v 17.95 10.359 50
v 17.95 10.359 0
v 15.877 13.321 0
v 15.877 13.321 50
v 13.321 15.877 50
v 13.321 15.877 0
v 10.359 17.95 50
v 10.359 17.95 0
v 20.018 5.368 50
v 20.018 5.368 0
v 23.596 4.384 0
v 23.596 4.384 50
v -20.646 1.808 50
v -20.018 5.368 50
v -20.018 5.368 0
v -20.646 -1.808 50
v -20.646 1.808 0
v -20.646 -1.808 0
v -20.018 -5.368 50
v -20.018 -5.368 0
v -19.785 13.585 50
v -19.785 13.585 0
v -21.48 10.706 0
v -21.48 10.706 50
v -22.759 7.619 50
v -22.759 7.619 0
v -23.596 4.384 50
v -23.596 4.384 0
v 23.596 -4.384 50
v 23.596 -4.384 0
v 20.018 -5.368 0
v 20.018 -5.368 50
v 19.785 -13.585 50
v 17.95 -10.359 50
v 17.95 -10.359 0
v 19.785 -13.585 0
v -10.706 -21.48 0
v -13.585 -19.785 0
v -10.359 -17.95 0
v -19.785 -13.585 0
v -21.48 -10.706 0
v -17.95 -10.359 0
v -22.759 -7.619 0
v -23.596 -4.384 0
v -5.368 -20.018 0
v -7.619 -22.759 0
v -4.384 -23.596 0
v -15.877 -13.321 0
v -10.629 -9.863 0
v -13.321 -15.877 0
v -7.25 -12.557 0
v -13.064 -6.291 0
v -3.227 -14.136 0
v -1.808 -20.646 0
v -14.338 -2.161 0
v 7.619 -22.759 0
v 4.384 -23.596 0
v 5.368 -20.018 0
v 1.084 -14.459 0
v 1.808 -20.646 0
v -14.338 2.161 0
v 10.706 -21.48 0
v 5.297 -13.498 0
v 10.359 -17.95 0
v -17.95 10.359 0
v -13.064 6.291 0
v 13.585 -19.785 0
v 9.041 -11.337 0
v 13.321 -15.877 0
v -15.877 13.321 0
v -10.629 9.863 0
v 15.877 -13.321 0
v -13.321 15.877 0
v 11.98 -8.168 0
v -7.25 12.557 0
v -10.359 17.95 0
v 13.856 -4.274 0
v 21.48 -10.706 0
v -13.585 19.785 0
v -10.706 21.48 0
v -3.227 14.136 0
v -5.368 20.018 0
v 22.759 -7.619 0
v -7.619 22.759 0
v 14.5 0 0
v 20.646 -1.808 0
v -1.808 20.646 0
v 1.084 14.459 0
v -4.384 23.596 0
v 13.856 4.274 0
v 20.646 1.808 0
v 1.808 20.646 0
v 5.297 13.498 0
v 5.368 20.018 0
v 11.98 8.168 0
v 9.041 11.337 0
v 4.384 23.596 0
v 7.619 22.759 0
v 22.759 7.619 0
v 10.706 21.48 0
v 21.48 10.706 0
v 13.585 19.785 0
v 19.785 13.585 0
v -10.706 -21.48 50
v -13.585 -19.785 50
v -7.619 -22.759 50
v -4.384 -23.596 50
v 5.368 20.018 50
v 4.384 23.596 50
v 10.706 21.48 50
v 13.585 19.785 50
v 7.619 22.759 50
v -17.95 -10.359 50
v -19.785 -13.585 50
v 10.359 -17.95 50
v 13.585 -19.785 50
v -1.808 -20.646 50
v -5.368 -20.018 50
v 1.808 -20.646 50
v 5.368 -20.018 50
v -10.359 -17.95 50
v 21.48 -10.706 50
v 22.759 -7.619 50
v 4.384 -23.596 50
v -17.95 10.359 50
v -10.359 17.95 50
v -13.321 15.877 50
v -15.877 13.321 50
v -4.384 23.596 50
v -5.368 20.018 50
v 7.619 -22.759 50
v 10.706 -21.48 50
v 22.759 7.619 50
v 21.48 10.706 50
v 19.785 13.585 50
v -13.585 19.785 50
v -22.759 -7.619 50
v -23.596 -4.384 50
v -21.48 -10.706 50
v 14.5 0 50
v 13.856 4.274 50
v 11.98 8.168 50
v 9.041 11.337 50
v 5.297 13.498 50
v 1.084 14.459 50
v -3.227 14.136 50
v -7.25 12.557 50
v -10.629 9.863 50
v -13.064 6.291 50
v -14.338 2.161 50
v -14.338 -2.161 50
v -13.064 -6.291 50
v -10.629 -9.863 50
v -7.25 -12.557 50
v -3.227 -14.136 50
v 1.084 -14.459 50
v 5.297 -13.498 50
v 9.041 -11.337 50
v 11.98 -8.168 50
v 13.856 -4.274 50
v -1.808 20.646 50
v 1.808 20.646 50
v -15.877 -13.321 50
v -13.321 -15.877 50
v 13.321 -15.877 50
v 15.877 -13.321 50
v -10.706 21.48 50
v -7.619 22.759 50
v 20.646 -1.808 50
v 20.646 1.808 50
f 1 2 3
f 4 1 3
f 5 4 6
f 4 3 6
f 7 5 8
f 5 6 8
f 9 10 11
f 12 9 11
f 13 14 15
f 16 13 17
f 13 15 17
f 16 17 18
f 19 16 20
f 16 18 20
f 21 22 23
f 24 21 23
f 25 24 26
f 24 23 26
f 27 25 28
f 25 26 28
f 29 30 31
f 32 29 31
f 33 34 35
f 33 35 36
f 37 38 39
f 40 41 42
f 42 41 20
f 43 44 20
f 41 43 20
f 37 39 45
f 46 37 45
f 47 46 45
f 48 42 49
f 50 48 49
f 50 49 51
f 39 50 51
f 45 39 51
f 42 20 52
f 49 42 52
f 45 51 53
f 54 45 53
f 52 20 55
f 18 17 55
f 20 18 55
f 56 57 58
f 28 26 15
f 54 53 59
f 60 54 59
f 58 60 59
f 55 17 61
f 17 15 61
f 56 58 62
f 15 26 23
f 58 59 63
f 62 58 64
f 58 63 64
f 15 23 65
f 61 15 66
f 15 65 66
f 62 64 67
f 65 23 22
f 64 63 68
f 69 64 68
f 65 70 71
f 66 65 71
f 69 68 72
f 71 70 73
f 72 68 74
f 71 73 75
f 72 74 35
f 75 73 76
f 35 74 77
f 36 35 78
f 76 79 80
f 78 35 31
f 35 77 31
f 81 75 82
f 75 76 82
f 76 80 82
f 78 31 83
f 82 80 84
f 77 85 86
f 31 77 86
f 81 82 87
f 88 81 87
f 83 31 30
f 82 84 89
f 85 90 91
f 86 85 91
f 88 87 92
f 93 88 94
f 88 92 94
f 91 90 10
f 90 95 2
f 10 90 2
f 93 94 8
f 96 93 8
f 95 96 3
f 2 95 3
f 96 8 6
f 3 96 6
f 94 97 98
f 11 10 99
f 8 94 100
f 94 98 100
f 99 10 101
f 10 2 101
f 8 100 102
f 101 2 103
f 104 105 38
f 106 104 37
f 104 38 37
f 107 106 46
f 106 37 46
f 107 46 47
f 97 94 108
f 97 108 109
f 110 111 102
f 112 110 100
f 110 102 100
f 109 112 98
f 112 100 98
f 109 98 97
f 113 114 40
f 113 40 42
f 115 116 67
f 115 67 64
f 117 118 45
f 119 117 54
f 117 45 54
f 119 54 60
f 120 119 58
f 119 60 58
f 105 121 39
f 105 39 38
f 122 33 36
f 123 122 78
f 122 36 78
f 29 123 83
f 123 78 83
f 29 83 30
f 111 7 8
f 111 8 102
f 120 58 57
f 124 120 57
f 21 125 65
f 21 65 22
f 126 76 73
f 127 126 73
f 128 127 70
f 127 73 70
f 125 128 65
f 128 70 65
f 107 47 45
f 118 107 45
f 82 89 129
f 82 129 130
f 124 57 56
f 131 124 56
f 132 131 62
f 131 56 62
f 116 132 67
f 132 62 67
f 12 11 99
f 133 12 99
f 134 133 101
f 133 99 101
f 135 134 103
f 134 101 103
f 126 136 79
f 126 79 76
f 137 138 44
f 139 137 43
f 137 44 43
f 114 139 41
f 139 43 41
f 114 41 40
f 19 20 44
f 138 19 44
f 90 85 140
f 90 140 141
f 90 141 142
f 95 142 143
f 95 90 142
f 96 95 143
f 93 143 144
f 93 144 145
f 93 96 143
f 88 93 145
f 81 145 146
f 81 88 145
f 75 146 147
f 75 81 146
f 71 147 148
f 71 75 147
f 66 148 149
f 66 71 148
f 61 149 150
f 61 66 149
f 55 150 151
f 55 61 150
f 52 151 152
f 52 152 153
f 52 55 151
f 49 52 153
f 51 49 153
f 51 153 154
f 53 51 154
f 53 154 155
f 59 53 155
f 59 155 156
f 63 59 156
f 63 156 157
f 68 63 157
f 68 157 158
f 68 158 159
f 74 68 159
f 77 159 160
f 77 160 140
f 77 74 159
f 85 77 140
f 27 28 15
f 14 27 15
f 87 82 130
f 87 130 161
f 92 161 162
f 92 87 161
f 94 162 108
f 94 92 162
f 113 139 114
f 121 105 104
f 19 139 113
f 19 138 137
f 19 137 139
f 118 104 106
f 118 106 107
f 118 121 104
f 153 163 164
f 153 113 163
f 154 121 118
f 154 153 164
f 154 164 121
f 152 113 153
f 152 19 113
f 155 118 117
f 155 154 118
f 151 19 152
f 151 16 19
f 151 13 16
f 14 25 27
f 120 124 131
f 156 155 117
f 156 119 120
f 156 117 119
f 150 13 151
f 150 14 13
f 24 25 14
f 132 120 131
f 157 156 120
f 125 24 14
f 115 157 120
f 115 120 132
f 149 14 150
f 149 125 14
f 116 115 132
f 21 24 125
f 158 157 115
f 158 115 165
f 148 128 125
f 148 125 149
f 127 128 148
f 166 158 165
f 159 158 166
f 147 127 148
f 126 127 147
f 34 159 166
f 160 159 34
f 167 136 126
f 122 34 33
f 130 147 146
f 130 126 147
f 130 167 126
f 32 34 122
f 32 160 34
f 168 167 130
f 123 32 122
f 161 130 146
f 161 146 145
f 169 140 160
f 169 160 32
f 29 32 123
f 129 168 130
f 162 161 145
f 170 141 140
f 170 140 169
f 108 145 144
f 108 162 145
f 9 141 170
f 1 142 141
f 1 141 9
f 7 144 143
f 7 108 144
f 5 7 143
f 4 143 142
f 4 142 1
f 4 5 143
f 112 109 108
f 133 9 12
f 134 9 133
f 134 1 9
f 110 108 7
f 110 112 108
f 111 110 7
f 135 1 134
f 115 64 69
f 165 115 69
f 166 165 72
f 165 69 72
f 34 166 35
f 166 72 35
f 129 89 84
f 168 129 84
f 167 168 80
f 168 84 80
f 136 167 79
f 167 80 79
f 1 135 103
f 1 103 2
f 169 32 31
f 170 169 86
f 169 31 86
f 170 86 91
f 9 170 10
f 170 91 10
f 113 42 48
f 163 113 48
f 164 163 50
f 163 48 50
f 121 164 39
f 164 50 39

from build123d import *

# Parameters (mm, degrees)
ESQUISSE5_R                  = 24
ESQUISSE5_R_2                = 14.5
BOSS_EXTRU_2_DEPTH           = 50
ENL_V_MAT_EXTRU_4_DEPTH      = 51
ENL_V_MAT_EXTRU_4_DEPTH_BACK = 16


with BuildPart() as part:
    # Esquisse5 → Boss.-Extru.2 (new body)
    with BuildSketch(Plane.XY):
        Circle(ESQUISSE5_R)
        Circle(ESQUISSE5_R_2, mode=Mode.SUBTRACT)
    extrude(amount=BOSS_EXTRU_2_DEPTH)

    # Esquisse6 → Enlèv. mat.-Extru.4 (cut, two sides)
    with BuildSketch(Plane.XY) as enl_v_mat_extru_4_sk:
        with BuildLine():
            Line((-4.384096163, 23.596179793), (-5.367769198, 20.017709679))
            ThreePointArc((-5.367769198, 20.017709679), (0, 20.724904028), (5.367769198, 20.017709679))
            Line((5.367769198, 20.017709679), (4.384096163, 23.596179793))
            ThreePointArc((4.384096163, 23.596179793), (0, 24), (-4.384096163, 23.596179793))
        make_face()
        with BuildLine():
            Line((19.785042868, 13.584994616), (17.950244258, 10.359072259))
            ThreePointArc((17.950244258, 10.359072259), (14.654720178, 14.654720178), (10.359072259, 17.950244258))
            Line((10.359072259, 17.950244258), (13.584994616, 19.785042868))
            ThreePointArc((13.584994616, 19.785042868), (16.970562748, 16.970562748), (19.785042868, 13.584994616))
        make_face()
        with BuildLine():
            Line((23.596179793, -4.384096163), (20.017709679, -5.367769198))
            ThreePointArc((20.017709679, -5.367769198), (20.724904028, 0), (20.017709679, 5.367769198))
            Line((20.017709679, 5.367769198), (23.596179793, 4.384096163))
            ThreePointArc((23.596179793, 4.384096163), (24, 0), (23.596179793, -4.384096163))
        make_face()
        with BuildLine():
            Line((13.584994616, -19.785042868), (10.359072259, -17.950244258))
            ThreePointArc((10.359072259, -17.950244258), (14.654720178, -14.654720178), (17.950244258, -10.359072259))
            Line((17.950244258, -10.359072259), (19.785042868, -13.584994616))
            ThreePointArc((19.785042868, -13.584994616), (16.970562748, -16.970562748), (13.584994616, -19.785042868))
        make_face()
        with BuildLine():
            Line((-4.384096163, -23.596179793), (-5.367769198, -20.017709679))
            ThreePointArc((-5.367769198, -20.017709679), (0, -20.724904028), (5.367769198, -20.017709679))
            Line((5.367769198, -20.017709679), (4.384096163, -23.596179793))
            ThreePointArc((4.384096163, -23.596179793), (0, -24), (-4.384096163, -23.596179793))
        make_face()
        with BuildLine():
            Line((-19.785042868, -13.584994616), (-17.950244258, -10.359072259))
            ThreePointArc((-17.950244258, -10.359072259), (-14.654720178, -14.654720178), (-10.359072259, -17.950244258))
            Line((-10.359072259, -17.950244258), (-13.584994616, -19.785042868))
            ThreePointArc((-13.584994616, -19.785042868), (-16.970562748, -16.970562748), (-19.785042868, -13.584994616))
        make_face()
        with BuildLine():
            Line((-23.596179793, 4.384096163), (-20.017709679, 5.367769198))
            ThreePointArc((-20.017709679, 5.367769198), (-20.724904028, 0), (-20.017709679, -5.367769198))
            Line((-20.017709679, -5.367769198), (-23.596179793, -4.384096163))
            ThreePointArc((-23.596179793, -4.384096163), (-24, 0), (-23.596179793, 4.384096163))
        make_face()
        with BuildLine():
            Line((-13.584994616, 19.785042868), (-10.359072259, 17.950244258))
            ThreePointArc((-10.359072259, 17.950244258), (-14.654720178, 14.654720178), (-17.950244258, 10.359072259))
            Line((-17.950244258, 10.359072259), (-19.785042868, 13.584994616))
            ThreePointArc((-19.785042868, 13.584994616), (-16.970562748, 16.970562748), (-13.584994616, 19.785042868))
        make_face()
    extrude(amount=ENL_V_MAT_EXTRU_4_DEPTH, mode=Mode.SUBTRACT)
    extrude(enl_v_mat_extru_4_sk.sketch, amount=-ENL_V_MAT_EXTRU_4_DEPTH_BACK, mode=Mode.SUBTRACT)


solid = part.part
